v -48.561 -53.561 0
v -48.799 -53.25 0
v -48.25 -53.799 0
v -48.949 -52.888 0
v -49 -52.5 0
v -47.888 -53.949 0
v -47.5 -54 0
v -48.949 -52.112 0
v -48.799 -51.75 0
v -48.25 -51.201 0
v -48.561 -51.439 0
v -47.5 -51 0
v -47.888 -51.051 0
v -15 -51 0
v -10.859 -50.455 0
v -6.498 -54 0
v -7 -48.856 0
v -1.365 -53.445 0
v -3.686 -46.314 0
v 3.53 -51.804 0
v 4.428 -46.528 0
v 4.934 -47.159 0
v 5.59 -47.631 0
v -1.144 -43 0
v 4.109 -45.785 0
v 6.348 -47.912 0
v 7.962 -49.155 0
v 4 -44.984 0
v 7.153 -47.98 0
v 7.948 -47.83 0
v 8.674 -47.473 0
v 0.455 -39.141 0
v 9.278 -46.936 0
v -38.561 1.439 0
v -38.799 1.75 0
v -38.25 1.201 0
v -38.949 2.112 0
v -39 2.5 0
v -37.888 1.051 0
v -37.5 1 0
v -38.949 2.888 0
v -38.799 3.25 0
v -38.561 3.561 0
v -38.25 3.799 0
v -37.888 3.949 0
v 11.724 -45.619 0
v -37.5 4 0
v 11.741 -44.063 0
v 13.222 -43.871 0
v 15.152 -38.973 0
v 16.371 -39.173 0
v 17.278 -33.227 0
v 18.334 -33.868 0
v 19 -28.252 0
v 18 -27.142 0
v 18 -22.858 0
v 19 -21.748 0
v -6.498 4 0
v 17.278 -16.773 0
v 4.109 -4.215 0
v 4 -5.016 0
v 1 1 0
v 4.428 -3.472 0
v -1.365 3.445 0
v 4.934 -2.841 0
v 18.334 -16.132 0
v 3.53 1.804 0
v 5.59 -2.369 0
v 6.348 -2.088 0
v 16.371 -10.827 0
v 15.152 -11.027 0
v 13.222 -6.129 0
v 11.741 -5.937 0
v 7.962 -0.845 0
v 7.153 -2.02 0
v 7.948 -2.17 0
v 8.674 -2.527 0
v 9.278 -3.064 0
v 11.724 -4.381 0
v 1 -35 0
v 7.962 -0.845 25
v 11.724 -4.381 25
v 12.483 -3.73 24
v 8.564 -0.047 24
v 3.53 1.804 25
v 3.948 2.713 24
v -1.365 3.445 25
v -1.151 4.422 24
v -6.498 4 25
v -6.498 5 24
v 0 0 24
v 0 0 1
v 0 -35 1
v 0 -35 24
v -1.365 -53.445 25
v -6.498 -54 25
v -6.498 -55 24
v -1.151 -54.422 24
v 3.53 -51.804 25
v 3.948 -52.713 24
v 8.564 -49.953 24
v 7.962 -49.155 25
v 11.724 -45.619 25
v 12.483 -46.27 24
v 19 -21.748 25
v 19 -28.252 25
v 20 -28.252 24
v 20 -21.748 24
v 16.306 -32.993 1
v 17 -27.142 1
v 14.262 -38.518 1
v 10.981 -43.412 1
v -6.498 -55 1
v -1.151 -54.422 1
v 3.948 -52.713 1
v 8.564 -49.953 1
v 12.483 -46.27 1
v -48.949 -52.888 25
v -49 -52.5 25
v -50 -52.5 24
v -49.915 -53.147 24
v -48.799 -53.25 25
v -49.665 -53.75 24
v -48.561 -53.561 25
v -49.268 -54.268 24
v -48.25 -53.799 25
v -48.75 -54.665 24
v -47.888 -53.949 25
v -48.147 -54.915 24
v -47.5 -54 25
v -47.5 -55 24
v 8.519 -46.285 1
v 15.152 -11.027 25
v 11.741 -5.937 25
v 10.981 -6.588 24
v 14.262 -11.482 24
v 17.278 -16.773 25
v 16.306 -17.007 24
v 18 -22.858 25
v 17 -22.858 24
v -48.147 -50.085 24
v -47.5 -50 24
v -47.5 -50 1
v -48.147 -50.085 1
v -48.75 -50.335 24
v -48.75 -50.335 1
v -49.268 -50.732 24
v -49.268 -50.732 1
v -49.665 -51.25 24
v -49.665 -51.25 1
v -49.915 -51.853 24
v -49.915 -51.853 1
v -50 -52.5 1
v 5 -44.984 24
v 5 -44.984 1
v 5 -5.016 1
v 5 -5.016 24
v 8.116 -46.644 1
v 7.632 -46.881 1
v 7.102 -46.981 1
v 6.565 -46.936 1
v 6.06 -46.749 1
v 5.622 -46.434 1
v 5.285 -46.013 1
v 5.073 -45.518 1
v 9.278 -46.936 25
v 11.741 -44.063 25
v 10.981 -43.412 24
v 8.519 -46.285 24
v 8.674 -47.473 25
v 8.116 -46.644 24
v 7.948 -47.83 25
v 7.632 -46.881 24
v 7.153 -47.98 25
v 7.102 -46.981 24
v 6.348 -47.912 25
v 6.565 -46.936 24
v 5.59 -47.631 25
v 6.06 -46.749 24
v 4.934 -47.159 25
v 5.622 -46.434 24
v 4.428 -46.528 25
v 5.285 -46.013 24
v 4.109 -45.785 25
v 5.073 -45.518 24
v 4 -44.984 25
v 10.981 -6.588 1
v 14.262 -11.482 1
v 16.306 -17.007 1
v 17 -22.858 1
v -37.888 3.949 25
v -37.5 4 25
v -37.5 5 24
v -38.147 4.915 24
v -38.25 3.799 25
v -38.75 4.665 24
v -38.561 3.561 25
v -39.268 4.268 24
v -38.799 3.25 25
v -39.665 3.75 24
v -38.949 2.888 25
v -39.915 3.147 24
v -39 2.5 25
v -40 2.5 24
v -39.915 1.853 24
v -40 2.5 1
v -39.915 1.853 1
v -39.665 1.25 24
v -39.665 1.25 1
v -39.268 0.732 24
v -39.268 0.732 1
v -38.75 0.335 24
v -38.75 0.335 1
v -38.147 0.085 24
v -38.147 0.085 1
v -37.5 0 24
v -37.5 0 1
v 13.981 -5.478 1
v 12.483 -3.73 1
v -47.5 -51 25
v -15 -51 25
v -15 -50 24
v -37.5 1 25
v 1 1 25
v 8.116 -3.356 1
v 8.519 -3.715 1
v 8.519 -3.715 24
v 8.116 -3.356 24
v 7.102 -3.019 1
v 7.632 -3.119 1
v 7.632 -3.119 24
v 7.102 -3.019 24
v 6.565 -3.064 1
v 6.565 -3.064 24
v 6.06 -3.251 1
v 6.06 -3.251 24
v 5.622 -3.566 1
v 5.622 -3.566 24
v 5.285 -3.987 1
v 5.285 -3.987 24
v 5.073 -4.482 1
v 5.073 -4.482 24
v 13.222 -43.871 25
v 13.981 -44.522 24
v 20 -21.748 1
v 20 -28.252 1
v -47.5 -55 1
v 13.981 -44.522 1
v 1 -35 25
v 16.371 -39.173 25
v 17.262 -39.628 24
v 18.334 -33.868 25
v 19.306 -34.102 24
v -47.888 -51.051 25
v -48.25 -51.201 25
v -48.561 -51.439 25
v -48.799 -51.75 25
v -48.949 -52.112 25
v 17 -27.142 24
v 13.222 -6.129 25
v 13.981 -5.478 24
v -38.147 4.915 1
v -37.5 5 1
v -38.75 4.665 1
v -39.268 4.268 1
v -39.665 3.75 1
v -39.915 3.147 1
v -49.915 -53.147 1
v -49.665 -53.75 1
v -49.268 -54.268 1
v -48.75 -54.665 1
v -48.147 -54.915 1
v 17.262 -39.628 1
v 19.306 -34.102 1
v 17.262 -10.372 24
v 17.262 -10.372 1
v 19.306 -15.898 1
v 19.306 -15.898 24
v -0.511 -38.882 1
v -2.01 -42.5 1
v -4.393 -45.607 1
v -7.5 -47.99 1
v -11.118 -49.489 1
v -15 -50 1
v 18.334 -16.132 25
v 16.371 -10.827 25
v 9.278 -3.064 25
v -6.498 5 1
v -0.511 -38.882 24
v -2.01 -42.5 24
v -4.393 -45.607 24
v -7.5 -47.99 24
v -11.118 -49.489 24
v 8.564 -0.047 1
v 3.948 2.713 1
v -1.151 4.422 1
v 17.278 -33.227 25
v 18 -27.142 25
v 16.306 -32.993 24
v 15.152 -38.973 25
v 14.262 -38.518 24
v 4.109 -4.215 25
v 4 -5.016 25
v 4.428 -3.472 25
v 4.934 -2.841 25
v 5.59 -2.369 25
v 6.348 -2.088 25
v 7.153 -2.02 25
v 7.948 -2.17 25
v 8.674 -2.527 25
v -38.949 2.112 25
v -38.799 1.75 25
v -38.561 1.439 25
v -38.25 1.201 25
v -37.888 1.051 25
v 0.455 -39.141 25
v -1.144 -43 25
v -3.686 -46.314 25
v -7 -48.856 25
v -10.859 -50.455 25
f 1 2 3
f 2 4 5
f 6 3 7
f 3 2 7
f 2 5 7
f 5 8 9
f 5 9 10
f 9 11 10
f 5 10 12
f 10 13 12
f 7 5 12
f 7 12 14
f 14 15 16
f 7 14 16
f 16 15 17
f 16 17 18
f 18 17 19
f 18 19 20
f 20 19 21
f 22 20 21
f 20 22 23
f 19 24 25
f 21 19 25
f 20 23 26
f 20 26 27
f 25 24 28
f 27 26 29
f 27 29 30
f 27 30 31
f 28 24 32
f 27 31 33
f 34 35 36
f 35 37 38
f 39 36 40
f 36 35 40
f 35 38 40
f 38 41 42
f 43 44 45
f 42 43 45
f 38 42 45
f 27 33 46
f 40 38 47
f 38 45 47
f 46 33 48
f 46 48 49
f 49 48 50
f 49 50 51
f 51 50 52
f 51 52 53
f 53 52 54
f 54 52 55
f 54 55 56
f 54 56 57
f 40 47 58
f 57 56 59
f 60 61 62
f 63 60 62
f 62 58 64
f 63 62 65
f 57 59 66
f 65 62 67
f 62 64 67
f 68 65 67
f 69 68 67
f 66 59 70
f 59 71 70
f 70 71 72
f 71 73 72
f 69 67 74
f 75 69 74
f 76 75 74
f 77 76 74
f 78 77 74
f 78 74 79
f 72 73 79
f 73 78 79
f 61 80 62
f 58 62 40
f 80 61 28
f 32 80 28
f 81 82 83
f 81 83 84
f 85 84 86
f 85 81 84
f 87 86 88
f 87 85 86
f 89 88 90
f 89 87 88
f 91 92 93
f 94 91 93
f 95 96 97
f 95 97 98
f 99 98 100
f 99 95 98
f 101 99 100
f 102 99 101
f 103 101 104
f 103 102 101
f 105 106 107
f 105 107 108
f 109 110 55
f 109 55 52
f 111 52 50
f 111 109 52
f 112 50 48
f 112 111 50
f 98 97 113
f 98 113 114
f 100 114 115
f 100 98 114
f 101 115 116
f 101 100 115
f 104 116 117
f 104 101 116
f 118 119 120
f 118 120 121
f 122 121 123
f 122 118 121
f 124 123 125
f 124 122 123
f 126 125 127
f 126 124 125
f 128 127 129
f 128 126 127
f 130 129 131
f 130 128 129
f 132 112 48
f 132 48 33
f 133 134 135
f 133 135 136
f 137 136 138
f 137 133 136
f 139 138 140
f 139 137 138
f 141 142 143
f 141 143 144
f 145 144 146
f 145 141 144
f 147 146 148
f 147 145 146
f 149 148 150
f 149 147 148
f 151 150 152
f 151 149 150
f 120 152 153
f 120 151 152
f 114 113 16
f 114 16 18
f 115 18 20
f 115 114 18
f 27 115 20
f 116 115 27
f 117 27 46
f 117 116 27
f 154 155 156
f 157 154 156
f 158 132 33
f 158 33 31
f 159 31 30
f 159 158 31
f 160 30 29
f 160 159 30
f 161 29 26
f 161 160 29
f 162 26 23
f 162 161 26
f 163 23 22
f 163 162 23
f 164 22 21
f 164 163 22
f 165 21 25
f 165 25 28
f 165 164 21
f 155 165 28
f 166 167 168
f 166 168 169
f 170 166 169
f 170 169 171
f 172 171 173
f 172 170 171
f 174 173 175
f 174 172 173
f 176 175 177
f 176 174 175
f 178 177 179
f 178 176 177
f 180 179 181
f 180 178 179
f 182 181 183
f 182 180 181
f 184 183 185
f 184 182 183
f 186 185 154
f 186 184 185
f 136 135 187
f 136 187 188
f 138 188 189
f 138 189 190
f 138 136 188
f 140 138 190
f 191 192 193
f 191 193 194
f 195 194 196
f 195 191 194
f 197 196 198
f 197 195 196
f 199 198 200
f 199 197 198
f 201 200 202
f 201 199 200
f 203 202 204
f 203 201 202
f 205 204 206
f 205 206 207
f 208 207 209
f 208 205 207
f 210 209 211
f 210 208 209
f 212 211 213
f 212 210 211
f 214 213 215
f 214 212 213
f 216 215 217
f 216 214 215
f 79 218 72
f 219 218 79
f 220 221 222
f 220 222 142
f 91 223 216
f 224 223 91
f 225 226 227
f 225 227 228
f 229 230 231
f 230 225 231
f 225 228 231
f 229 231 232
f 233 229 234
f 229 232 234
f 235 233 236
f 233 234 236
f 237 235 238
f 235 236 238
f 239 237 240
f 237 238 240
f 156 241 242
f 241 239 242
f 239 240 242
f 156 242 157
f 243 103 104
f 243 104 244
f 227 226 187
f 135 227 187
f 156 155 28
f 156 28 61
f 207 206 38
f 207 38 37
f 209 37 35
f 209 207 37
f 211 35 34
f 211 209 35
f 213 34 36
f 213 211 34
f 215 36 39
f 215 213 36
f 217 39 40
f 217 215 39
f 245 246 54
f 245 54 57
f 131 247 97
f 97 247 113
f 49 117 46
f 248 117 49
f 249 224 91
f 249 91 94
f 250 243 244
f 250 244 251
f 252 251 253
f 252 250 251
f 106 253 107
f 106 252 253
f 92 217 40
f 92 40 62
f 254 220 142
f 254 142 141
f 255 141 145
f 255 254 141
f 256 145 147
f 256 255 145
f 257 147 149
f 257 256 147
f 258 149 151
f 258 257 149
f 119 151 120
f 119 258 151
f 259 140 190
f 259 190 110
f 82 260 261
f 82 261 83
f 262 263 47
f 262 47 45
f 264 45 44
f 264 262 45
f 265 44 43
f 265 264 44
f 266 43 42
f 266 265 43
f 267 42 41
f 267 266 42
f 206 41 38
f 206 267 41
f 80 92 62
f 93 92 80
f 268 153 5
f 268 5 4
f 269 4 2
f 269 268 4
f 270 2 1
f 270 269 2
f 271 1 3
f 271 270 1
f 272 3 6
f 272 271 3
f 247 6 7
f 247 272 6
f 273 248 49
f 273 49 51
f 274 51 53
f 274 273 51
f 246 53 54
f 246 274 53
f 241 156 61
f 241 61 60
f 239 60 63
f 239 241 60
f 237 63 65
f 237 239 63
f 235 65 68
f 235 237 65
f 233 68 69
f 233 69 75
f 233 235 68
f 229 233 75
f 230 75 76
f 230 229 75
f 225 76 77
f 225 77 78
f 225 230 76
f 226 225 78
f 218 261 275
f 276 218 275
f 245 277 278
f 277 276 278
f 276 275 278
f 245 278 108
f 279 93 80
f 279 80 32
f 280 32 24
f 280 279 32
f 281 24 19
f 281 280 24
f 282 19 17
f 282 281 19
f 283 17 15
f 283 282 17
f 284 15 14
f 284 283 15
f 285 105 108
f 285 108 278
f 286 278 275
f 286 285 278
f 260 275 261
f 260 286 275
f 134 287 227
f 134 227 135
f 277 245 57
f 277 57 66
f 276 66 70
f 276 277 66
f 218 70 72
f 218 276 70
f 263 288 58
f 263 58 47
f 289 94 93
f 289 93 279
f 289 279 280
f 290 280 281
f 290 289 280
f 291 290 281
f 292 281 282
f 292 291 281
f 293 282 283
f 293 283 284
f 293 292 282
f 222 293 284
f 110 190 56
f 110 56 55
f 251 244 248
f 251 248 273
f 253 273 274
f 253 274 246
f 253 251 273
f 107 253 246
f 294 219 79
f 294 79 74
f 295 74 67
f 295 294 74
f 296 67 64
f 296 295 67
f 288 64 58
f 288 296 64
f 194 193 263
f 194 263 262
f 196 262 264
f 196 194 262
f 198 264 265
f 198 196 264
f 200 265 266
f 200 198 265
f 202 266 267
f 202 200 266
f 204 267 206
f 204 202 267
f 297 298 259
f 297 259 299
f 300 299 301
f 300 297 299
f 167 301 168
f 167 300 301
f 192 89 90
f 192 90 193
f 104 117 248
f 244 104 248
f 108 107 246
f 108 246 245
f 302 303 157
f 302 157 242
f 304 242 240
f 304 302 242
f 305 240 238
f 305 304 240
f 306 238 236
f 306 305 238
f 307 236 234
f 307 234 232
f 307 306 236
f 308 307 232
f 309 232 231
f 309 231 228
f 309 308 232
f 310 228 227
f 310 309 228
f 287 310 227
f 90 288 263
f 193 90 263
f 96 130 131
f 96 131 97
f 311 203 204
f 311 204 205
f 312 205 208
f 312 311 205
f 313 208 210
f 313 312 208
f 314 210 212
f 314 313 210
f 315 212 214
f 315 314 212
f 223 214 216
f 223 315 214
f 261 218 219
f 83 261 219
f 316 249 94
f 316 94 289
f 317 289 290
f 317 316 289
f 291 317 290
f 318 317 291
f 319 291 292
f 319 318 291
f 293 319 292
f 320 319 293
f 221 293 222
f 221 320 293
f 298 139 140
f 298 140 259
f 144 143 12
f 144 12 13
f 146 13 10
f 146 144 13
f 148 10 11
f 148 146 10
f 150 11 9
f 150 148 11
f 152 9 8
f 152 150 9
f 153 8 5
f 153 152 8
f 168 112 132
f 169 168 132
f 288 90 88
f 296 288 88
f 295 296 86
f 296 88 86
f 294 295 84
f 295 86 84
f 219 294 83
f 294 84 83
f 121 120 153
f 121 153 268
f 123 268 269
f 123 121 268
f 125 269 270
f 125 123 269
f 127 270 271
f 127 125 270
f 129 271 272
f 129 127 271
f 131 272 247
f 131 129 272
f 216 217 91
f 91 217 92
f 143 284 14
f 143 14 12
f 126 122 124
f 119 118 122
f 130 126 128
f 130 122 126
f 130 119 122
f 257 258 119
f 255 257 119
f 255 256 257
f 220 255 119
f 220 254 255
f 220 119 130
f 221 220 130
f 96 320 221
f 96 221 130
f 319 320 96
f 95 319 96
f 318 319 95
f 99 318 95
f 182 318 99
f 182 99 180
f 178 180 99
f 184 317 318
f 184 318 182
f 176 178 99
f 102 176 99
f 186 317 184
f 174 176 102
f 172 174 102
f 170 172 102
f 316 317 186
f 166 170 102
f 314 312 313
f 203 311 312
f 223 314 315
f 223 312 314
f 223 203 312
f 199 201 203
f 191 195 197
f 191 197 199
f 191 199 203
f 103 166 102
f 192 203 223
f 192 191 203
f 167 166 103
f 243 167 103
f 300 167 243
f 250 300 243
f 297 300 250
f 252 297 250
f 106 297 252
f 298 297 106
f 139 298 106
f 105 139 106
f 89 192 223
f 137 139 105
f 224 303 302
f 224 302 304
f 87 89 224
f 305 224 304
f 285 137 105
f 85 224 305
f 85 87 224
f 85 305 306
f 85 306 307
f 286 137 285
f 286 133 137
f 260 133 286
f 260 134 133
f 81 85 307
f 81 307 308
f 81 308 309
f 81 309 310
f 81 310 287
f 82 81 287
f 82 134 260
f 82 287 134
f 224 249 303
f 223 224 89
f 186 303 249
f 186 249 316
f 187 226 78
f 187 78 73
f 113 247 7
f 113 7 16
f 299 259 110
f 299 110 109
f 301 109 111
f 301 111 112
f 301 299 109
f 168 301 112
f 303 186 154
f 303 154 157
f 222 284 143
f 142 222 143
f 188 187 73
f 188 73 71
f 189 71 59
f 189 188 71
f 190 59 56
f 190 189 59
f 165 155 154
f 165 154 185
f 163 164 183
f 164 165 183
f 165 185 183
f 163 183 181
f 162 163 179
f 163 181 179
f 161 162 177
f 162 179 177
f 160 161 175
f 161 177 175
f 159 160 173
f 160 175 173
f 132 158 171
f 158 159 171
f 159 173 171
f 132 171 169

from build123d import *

# Parameters (mm, degrees)
F0_W     = 40
F0_H     = 5
F1_DEPTH = 25
F2_R     = 15
F3_R     = 25
F4_R     = 2.49999
F5_R     = 2
F6_SIZE  = 1


# Not quite as in the source:
# - a fillet or chamfer is up to 0.001 mm smaller than in the source, because OpenCascade refuses the exact size


with BuildPart() as f1:
    # F0 (on Top) → F1 (new body)
    with BuildSketch(Plane.XY):
        Polygon((0, 5), (0, 0), (0, -50), (-50, -50), (-50, -55), (5, -55), (5, -50.3902277714), (5, 0.3902277714), (5, 5), align=None)
        Polygon((20, -12.5), (5, 5), (5, 0.3902277714), (17, -13.6097722286), (17, -36.3902277714), (5, -50.3902277714), (5, -55), (20, -37.5), align=None)
        with Locations((-20, 2.5)):
            Rectangle(F0_W, F0_H)
    extrude(amount=F1_DEPTH)

    # F2
    f2_edges = [f1.edges().sort_by_distance(p)[0] for p in [
        (0, -50, 12.5),
    ]]
    fillet(f2_edges, radius=F2_R)

    # F3
    f3_edges = [f1.edges().sort_by_distance(p)[0] for p in [
        (5, -55, 12.5),
        (20, -37.5, 12.5),
        (20, -12.5, 12.5),
        (5, 5, 12.5),
        (17, -36.390228, 12.5),
        (17, -13.609772, 12.5),
    ]]
    fillet(f3_edges, radius=F3_R)

    # F4 (radius 2.5 in the source; OpenCascade refuses exactly that, so slightly less here)
    f4_edges = [f1.edges().sort_by_distance(p)[0] for p in [
        (-50, -55, 12.5),
        (-50, -50, 12.5),
        (-40, 0, 12.5),
        (-40, 5, 12.5),
    ]]
    fillet(f4_edges, radius=F4_R)

    # F5
    f5_edges = [f1.edges().sort_by_distance(p)[0] for p in [
        (5, -50.390228, 12.5),
        (5, 0.390228, 12.5),
    ]]
    fillet(f5_edges, radius=F5_R)

    # F6
    f6_edges = [f1.edges().sort_by_distance(p)[0] for p in [
        (9.749964, -5.151397, 25),
        (6.306108, -3.140517, 25),
        (15.447125, -14.184218, 25),
        (5, -25, 25),
        (17, -25, 25),
        (6.306108, -46.859483, 25),
        (15.447125, -35.815782, 25),
        (9.749964, -44.848603, 25),
        (-21.999192, 5, 25),
        (-39.26777, 4.26777, 25),
        (3.948047, 2.712822, 25),
        (-40, 2.5, 25),
        (13.232229, -4.604267, 25),
        (-39.26777, 0.73223, 25),
        (18.447125, -13.074446, 25),
        (-18.750005, 0, 25),
        (20, -25, 25),
        (0, -17.5, 25),
        (18.447125, -36.925554, 25),
        (-4.393398, -45.606602, 25),
        (13.232229, -45.395733, 25),
        (-31.250005, -50, 25),
        (3.948047, -52.712822, 25),
        (-49.26777, -50.73223, 25),
        (-26.999192, -55, 25),
        (-50, -52.5, 25),
        (-49.26777, -54.26777, 25),
        (9.749964, -5.151397, 0),
        (6.306108, -3.140517, 0),
        (15.447125, -14.184218, 0),
        (5, -25, 0),
        (17, -25, 0),
        (6.306108, -46.859483, 0),
        (15.447125, -35.815782, 0),
        (9.749964, -44.848603, 0),
        (-21.999192, 5, 0),
        (-39.26777, 4.26777, 0),
        (3.948047, 2.712822, 0),
        (-40, 2.5, 0),
        (13.232229, -4.604267, 0),
        (-39.26777, 0.73223, 0),
        (18.447125, -13.074446, 0),
        (-18.750005, 0, 0),
        (20, -25, 0),
        (0, -17.5, 0),
        (18.447125, -36.925554, 0),
        (-4.393398, -45.606602, 0),
        (13.232229, -45.395733, 0),
        (-31.250005, -50, 0),
        (3.948047, -52.712822, 0),
        (-49.26777, -50.73223, 0),
        (-26.999192, -55, 0),
        (-50, -52.5, 0),
        (-49.26777, -54.26777, 0),
    ]]
    chamfer(f6_edges, length=F6_SIZE)


solid = f1.part
